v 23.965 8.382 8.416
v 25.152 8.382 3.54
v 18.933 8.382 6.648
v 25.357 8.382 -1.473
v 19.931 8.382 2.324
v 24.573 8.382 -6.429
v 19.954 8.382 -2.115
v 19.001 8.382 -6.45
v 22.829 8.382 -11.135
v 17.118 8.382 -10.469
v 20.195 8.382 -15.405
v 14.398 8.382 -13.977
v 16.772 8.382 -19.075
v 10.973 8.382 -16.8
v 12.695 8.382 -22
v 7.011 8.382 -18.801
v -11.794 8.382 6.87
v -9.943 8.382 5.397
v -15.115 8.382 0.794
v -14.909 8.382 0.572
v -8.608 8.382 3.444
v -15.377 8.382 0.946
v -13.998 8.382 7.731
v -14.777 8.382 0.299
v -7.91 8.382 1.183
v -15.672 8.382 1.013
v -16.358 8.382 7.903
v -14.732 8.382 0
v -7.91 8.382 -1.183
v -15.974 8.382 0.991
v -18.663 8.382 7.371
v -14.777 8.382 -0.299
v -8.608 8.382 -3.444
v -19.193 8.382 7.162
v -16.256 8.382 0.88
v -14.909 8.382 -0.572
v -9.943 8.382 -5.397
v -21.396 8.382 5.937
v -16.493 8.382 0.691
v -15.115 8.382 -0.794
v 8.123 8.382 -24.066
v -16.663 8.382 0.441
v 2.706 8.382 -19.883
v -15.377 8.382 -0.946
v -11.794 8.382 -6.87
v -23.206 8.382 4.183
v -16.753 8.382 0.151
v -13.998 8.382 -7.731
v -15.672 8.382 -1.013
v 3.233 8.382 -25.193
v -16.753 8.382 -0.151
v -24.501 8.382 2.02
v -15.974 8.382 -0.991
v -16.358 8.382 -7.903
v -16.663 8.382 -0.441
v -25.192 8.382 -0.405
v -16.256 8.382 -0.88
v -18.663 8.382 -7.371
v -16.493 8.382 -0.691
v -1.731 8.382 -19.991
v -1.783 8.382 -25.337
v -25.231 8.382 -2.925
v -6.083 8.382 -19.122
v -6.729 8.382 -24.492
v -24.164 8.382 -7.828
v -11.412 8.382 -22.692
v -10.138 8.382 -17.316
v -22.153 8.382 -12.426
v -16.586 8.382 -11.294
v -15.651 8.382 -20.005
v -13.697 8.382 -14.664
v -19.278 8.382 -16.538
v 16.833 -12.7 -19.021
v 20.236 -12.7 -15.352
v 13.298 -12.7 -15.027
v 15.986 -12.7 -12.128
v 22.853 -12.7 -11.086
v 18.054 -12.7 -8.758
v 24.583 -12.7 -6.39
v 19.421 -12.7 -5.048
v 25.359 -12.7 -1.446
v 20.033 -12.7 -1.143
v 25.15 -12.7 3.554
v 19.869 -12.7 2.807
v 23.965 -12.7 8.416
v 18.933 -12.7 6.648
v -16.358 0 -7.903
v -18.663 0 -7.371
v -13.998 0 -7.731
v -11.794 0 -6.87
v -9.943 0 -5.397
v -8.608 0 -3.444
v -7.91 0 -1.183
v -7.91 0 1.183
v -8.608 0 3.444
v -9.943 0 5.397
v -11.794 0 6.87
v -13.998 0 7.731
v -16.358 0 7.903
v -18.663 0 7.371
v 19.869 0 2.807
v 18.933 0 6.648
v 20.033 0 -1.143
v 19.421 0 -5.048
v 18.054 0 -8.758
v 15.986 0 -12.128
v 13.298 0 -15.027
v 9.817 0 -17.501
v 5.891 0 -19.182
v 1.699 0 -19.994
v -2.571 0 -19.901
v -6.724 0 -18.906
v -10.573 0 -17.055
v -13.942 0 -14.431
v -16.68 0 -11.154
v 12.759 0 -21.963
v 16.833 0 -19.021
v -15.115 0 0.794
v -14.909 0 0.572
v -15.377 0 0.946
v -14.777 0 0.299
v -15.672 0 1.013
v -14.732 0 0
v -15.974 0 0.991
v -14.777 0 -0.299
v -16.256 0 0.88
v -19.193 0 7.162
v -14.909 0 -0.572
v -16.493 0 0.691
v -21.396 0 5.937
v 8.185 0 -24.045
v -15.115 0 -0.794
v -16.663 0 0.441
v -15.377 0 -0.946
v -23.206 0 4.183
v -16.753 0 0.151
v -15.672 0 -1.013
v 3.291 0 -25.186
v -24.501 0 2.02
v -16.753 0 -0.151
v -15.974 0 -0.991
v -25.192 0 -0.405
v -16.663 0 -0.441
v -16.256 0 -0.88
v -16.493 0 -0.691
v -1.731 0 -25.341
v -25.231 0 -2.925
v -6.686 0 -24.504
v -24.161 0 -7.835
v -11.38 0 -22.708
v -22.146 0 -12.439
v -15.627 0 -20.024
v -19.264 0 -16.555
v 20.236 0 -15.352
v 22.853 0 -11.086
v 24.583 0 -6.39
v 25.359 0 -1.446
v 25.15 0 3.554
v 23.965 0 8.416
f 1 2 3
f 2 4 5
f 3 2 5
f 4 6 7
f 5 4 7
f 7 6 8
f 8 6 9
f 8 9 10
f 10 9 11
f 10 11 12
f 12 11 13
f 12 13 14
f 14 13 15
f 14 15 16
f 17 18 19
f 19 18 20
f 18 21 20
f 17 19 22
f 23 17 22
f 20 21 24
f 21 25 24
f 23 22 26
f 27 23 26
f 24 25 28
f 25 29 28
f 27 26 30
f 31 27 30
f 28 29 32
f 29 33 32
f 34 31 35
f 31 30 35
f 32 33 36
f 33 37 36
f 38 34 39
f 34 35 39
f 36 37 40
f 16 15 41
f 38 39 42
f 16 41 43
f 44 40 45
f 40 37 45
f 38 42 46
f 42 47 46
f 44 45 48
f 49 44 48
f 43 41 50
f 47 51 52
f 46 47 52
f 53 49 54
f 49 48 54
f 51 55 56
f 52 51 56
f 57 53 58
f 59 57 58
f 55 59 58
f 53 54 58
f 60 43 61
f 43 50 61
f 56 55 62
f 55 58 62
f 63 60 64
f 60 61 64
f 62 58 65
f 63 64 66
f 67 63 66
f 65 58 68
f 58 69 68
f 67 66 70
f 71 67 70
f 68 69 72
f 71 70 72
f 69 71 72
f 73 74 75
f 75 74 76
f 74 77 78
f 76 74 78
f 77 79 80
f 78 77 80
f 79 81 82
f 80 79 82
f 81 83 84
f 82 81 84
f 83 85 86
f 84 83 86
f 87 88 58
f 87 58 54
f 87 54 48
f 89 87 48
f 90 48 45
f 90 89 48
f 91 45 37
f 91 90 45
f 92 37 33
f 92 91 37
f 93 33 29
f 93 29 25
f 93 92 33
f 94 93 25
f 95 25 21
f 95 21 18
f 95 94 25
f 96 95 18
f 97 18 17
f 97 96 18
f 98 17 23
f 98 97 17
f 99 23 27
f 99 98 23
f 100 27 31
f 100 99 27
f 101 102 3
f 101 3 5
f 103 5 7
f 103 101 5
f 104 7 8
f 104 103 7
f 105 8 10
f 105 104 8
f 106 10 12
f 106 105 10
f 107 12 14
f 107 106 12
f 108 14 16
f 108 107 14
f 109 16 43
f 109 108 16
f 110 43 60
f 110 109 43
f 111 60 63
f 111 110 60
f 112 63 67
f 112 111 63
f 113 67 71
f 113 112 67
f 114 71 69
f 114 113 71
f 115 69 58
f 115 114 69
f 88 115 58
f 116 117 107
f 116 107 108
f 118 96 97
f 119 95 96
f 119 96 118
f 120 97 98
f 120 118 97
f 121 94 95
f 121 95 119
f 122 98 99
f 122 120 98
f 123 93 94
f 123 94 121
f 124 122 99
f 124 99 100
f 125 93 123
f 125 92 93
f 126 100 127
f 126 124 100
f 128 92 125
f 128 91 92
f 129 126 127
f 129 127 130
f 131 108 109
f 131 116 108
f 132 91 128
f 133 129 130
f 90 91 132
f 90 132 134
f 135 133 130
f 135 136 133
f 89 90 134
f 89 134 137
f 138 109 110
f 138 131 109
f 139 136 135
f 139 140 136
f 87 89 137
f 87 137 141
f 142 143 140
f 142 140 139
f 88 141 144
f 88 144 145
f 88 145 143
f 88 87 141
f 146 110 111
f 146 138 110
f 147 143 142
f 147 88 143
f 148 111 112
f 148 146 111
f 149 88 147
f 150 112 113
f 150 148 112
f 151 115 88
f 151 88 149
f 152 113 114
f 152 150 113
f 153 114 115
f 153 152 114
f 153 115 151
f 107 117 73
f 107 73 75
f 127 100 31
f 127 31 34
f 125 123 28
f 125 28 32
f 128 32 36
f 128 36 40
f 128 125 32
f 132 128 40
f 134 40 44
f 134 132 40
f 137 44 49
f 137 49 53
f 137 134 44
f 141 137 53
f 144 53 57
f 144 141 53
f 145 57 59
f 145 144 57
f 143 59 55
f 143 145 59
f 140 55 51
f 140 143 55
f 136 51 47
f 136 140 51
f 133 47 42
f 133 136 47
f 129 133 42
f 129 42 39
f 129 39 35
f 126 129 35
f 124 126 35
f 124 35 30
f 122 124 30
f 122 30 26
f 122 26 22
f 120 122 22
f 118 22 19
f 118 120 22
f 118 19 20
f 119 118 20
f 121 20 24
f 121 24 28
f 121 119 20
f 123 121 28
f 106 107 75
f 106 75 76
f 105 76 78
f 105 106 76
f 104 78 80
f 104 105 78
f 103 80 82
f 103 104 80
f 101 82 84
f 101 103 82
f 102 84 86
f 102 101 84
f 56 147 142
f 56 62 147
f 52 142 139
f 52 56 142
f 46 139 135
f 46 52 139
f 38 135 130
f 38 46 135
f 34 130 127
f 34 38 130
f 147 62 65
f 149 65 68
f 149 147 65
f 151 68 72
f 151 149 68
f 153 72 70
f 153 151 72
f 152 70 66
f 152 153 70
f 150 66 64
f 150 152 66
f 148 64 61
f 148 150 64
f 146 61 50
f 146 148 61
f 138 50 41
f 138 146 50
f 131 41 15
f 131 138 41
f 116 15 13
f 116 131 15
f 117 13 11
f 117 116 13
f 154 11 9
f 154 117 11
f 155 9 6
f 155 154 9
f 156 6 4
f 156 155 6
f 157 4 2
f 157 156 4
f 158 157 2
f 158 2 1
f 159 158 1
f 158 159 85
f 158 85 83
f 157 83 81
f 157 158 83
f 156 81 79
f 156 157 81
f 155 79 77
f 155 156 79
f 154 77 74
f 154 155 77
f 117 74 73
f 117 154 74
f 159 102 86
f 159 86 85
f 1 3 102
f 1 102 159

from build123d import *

# Parameters (mm, degrees)
SKETCH4_R           = 1.016
BOSS_EXTRUDE3_DEPTH = 8.382
BOSS_EXTRUDE4_DEPTH = 12.7
FILLET4_R           = 9.652


with BuildPart() as part:
    # Sketch4 → Boss-Extrude3 (new body)
    with BuildSketch(Plane(origin=(0, 0, 0), x_dir=(1, 0, 0), z_dir=(0, 1, 0))):
        with BuildLine():
            Line((-18.663003184, -7.371341), (-24.923761703, -4.89551862))
            ThreePointArc((-24.923761703, -4.89551862), (1.824176411, 25.334410994), (23.965300472, -8.415721794))
            Line((23.965300472, -8.415721794), (18.932587373, -6.648420217))
            ThreePointArc((18.932587373, -6.648420217), (7.011176439, 18.801270195), (-18.663003184, 7.371341))
            ThreePointArc((-18.663003184, 7.371341), (-7.821215551, 0), (-18.663003184, -7.371341))
        make_face()
        with Locations((-15.748, 0)):
            Circle(SKETCH4_R, mode=Mode.SUBTRACT)
    extrude(amount=BOSS_EXTRUDE3_DEPTH)

    # Sketch5 → Boss-Extrude4 (add)
    with BuildSketch(Plane.XZ):
        with BuildLine():
            Line((18.932587373, 6.648420217), (23.965300472, 8.415721794))
            ThreePointArc((23.965300472, 8.415721794), (24.582982591, -6.390380813), (16.83300832, -19.021299401))
            Line((16.83300832, -19.021299401), (13.298076573, -15.026826527))
            ThreePointArc((13.298076573, -15.026826527), (19.420556247, -5.048400842), (18.932587373, 6.648420217))
        make_face()
    extrude(amount=BOSS_EXTRUDE4_DEPTH)

    # Fillet4
    fillet4_edges = [part.edges().sort_by_distance(p)[0] for p in [
        (-24.923761703, 4.191, 4.89551862),
    ]]
    fillet(fillet4_edges, radius=FILLET4_R)


solid = part.part
